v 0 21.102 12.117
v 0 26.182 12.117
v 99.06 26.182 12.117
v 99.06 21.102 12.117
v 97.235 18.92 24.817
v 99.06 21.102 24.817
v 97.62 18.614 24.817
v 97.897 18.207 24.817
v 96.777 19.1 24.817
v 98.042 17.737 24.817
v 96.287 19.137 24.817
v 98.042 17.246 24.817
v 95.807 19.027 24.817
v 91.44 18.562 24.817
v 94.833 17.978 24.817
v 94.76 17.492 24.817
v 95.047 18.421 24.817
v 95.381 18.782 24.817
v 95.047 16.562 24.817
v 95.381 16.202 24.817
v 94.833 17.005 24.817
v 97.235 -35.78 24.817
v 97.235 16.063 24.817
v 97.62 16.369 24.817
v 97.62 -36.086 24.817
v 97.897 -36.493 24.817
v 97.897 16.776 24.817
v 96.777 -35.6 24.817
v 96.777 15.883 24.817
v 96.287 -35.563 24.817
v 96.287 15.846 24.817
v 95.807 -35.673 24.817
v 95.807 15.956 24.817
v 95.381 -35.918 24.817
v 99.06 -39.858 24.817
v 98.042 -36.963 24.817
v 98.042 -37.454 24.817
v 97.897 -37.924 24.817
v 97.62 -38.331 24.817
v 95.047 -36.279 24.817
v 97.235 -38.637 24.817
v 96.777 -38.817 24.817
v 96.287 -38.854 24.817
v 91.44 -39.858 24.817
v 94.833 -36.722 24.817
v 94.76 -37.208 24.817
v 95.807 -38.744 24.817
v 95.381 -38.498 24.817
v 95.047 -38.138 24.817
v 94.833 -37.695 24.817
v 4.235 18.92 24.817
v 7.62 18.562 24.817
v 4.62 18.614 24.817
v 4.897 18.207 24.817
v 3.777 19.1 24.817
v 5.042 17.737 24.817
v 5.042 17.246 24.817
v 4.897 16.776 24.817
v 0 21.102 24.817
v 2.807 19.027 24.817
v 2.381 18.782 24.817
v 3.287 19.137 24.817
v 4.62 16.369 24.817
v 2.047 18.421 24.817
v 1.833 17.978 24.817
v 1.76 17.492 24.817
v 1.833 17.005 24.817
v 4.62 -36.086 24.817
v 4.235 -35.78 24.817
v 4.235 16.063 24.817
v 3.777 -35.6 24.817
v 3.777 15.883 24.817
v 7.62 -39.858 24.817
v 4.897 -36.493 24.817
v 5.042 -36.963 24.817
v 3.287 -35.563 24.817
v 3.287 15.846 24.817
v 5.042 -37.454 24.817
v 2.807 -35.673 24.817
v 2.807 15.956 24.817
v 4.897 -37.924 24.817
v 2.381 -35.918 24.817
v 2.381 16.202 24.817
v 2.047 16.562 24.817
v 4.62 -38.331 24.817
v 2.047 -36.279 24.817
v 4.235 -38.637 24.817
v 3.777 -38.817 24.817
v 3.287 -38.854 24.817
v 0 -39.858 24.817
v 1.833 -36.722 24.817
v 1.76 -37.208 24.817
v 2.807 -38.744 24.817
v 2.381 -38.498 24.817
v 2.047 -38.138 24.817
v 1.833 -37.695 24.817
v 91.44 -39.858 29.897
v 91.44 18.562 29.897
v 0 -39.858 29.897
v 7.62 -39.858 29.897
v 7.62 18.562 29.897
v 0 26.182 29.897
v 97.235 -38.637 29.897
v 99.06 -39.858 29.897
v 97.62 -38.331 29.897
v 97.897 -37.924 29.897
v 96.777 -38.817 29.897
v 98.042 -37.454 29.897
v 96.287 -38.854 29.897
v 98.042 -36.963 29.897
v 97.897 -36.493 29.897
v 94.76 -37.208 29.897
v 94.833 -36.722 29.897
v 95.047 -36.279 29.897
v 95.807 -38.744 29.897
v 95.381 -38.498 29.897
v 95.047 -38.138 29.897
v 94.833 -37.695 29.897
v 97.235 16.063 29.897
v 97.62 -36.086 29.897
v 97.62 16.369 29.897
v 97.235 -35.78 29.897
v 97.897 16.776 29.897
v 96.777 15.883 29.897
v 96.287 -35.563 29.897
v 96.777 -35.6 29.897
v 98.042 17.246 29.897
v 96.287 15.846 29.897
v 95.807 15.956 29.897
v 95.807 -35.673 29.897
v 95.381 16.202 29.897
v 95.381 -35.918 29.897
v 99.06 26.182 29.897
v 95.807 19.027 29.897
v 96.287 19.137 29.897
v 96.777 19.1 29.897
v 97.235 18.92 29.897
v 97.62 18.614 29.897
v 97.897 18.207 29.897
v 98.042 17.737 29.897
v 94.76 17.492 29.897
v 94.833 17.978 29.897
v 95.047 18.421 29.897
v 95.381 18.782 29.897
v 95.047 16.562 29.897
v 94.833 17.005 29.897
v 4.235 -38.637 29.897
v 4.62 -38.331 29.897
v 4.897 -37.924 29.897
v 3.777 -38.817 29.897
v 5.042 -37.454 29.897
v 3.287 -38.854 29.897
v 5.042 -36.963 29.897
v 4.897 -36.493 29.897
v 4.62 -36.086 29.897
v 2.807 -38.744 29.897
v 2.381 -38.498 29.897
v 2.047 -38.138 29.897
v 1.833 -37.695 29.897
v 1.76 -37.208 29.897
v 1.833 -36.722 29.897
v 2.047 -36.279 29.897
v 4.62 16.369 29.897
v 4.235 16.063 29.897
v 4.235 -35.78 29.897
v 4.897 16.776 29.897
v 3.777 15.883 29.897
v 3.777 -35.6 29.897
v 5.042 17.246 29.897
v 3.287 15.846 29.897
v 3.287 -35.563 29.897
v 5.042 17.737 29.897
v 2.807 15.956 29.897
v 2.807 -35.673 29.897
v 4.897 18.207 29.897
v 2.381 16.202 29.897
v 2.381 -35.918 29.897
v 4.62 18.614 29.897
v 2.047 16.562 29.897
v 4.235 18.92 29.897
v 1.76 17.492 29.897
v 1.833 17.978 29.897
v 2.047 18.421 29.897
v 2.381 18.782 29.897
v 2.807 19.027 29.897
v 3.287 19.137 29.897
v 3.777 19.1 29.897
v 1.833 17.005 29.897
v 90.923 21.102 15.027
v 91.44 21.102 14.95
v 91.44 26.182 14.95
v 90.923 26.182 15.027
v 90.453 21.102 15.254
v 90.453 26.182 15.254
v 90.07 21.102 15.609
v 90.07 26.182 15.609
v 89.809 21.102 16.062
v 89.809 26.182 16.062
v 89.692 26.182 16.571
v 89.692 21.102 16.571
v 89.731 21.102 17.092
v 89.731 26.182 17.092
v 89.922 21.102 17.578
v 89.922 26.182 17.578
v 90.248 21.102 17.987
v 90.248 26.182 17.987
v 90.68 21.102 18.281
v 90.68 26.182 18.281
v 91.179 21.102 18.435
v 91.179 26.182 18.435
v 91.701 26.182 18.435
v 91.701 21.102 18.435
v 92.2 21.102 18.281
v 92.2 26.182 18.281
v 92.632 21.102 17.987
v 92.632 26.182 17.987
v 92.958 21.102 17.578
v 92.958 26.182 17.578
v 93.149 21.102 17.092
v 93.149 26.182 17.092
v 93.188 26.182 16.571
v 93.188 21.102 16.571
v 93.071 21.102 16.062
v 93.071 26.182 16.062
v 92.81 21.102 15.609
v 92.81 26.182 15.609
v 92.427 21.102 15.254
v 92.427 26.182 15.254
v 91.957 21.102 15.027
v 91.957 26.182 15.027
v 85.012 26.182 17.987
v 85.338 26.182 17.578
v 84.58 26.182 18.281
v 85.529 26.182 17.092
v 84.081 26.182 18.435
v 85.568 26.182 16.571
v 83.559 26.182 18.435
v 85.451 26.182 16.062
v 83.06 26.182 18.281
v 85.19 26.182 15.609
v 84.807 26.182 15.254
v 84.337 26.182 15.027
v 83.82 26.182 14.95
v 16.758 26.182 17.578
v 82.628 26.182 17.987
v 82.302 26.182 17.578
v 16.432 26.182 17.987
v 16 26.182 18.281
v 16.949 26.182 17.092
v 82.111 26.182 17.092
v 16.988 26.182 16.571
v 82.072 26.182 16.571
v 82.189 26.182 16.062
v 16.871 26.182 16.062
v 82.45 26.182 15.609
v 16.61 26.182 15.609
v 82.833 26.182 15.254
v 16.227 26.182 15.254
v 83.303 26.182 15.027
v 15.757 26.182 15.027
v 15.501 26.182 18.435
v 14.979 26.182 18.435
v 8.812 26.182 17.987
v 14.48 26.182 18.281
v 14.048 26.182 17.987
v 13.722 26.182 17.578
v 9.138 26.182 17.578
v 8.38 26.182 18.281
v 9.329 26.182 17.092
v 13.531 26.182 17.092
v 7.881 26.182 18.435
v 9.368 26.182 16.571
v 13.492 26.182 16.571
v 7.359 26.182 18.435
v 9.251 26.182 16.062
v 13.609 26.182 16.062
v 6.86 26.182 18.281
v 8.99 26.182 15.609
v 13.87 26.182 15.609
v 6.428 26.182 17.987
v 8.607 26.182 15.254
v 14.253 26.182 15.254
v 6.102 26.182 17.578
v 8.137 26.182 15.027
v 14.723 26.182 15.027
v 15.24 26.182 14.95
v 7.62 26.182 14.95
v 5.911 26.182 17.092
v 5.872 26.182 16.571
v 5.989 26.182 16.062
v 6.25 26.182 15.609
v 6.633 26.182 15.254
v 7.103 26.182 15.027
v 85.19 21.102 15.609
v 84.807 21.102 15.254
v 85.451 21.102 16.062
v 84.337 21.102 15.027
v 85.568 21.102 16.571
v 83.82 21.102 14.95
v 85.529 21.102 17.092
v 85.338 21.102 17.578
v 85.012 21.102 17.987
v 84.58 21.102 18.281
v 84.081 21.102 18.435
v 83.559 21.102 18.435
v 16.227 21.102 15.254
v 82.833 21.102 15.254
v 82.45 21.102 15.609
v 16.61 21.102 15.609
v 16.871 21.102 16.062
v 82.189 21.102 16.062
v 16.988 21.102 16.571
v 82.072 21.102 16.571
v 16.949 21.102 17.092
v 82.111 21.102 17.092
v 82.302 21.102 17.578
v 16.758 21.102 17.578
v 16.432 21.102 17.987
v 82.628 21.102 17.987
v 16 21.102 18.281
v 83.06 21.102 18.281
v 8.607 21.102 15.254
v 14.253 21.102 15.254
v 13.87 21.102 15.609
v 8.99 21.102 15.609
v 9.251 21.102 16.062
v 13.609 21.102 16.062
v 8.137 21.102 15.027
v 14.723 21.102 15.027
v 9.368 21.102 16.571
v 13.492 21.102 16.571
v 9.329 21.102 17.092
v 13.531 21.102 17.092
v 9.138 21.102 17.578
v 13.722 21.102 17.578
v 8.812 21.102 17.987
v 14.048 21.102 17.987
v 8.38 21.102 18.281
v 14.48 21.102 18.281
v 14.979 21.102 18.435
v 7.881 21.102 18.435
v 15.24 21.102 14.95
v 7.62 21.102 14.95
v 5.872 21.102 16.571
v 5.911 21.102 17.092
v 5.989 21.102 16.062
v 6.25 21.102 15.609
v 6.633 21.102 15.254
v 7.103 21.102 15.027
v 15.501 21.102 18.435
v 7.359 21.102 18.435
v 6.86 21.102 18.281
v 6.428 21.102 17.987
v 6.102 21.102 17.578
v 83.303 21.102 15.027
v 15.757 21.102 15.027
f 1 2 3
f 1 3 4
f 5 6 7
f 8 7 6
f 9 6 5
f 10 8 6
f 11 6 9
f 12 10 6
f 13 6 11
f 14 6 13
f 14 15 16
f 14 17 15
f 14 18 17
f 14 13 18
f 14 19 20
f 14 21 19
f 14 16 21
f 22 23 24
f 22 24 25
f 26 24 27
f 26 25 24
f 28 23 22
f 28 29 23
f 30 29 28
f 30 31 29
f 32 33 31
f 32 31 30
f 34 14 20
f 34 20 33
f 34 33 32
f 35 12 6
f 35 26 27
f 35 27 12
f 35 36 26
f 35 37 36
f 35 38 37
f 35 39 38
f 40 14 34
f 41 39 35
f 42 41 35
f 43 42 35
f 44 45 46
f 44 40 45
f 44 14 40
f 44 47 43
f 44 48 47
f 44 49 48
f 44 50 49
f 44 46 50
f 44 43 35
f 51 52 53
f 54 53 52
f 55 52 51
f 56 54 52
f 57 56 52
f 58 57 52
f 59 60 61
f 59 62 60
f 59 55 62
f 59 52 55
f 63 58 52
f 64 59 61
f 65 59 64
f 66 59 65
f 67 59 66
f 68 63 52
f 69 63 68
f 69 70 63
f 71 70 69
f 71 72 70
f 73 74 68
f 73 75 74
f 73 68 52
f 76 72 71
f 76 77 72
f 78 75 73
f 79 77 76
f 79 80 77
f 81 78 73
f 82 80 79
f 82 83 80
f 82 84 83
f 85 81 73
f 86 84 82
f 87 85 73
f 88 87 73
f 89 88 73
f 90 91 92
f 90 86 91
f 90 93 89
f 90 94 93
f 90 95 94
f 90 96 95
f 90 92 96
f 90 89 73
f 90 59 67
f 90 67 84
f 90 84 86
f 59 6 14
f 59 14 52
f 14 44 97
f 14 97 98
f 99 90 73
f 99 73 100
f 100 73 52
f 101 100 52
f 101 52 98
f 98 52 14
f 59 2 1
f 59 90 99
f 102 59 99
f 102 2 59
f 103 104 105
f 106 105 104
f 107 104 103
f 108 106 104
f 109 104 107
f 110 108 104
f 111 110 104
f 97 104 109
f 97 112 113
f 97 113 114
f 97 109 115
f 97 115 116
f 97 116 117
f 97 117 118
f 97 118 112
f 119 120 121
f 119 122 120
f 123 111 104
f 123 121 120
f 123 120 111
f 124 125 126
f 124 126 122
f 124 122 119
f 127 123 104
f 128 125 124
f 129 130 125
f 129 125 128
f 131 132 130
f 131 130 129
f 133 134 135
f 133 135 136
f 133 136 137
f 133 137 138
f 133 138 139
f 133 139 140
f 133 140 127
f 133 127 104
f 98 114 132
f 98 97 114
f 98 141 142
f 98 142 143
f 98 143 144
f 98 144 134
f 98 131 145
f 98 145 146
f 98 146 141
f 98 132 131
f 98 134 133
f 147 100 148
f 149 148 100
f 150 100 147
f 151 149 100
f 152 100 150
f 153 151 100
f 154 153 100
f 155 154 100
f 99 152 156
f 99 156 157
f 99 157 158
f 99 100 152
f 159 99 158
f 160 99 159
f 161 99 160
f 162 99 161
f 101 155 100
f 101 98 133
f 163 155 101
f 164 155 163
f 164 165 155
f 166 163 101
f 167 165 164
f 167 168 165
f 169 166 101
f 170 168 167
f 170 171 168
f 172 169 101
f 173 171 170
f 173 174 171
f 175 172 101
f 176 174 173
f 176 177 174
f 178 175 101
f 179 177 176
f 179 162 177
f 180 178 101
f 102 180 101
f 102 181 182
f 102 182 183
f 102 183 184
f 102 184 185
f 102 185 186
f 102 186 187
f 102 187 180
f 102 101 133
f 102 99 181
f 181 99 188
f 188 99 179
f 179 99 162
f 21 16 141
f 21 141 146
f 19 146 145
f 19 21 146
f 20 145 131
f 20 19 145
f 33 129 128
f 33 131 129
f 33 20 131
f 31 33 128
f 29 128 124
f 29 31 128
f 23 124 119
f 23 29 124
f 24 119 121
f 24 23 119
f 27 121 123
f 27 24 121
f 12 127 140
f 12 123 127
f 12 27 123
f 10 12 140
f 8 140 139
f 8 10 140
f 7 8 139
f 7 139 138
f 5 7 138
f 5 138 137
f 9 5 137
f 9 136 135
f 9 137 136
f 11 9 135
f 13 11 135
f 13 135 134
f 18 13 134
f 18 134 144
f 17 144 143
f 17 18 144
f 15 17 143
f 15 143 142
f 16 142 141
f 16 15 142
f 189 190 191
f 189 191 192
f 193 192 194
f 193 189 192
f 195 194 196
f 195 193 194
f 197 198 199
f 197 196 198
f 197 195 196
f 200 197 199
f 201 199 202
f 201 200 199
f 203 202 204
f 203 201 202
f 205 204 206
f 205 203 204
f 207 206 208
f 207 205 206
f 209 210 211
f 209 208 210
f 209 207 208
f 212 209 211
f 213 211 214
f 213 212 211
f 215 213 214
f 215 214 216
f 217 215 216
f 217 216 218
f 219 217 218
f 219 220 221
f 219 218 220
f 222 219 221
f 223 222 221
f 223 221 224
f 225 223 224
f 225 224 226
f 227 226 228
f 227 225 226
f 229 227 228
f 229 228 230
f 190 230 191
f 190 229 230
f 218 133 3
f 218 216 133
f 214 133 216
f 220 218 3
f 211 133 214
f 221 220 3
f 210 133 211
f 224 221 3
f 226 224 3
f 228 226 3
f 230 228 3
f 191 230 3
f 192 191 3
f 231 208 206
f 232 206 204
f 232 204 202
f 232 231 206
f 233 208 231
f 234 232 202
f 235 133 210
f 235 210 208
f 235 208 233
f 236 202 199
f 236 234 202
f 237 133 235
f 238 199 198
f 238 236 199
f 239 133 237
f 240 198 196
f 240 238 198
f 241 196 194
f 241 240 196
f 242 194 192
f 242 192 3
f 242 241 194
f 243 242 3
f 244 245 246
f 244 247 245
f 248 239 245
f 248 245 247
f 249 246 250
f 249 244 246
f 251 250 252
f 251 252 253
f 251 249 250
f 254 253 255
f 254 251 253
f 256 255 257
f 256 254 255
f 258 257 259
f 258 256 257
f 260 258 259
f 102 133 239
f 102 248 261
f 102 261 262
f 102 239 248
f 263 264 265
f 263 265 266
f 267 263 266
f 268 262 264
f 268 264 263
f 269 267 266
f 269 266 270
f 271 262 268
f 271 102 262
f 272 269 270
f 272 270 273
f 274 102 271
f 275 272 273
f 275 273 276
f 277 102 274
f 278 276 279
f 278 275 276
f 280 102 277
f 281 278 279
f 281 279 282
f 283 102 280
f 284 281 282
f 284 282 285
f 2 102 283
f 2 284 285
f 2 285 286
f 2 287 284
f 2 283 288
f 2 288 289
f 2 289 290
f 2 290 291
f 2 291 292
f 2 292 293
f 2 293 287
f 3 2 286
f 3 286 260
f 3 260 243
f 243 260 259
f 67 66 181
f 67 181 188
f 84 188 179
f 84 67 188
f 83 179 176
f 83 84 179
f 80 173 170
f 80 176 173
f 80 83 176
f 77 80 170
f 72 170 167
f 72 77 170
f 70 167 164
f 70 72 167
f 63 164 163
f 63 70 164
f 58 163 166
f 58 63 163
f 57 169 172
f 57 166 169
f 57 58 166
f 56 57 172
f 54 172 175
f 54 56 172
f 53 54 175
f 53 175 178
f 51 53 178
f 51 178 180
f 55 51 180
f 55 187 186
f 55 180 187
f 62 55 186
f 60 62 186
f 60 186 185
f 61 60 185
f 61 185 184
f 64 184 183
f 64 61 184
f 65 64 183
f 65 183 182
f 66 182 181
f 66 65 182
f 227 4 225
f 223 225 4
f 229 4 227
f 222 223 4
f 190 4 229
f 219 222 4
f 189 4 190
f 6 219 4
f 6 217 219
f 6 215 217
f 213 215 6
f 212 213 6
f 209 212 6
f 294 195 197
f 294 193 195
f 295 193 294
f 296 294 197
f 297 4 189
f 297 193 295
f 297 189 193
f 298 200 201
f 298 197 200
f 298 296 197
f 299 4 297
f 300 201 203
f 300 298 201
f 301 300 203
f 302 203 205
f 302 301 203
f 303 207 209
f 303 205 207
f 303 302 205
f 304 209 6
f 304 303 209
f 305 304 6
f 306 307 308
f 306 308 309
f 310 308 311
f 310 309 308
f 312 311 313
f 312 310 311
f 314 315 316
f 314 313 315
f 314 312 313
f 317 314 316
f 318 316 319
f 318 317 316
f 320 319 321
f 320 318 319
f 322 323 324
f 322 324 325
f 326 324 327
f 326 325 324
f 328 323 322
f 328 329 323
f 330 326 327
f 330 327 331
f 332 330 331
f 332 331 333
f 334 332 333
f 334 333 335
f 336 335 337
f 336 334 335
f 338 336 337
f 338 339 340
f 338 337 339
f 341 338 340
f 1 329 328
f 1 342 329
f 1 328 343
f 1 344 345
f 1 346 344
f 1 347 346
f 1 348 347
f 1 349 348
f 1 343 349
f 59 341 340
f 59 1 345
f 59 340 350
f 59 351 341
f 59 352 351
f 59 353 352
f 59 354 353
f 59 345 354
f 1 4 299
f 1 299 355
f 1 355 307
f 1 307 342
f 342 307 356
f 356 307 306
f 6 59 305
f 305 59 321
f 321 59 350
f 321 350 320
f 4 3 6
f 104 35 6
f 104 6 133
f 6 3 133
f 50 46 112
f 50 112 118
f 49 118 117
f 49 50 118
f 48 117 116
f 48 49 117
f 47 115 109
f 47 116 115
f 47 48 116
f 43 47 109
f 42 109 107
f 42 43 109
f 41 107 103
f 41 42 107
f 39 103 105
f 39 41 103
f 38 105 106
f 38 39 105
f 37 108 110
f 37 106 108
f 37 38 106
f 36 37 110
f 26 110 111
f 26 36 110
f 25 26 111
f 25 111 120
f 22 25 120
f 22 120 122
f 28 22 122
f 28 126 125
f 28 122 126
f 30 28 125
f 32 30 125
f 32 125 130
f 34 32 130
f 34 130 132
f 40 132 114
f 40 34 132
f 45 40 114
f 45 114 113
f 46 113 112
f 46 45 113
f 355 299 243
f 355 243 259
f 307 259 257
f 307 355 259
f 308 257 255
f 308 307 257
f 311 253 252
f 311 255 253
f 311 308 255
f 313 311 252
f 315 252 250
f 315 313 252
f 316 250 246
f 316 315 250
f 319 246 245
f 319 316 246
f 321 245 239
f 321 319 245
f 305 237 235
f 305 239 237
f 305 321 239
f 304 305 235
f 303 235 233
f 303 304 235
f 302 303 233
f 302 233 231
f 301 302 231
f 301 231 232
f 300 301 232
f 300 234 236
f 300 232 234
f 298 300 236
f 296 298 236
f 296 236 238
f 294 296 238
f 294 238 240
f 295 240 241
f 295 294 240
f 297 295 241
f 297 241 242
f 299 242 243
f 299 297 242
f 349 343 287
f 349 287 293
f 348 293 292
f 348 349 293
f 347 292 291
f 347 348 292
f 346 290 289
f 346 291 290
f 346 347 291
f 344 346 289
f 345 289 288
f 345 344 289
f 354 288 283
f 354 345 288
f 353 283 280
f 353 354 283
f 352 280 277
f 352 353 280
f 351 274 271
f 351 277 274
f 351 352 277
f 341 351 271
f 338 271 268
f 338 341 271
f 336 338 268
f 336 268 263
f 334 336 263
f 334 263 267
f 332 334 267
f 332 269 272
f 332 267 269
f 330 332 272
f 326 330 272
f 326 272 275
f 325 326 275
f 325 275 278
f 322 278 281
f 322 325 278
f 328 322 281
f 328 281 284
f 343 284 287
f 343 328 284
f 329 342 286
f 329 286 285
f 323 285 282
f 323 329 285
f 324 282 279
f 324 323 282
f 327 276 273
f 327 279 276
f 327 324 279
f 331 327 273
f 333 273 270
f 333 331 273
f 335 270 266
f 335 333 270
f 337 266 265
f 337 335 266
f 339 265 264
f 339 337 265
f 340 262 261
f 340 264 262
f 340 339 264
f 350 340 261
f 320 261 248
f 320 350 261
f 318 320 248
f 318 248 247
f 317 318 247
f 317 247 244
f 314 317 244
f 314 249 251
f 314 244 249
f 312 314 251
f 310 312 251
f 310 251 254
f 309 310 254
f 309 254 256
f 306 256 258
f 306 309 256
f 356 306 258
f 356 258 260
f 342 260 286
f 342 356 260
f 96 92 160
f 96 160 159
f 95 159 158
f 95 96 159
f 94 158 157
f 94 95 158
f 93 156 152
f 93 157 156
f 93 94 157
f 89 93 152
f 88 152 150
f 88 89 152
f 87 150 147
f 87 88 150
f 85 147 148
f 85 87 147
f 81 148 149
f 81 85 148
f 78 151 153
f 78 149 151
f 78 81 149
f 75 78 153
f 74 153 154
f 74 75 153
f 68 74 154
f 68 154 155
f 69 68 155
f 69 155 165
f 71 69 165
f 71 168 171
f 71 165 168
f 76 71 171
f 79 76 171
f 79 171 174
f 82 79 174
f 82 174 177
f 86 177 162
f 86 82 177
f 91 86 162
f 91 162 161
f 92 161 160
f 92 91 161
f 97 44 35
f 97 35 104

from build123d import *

# Parameters (mm, degrees)
BOSS_EXTRUDE1_DEPTH = 99.06
SKETCH2_W           = 83.82
SKETCH2_H           = 60.96
CUT_EXTRUDE1_DEPTH  = 86.106
SKETCH3_R           = 1.65
CUT_EXTRUDE2_DEPTH  = 228.6
SKETCH4_R           = 1.7526
CUT_EXTRUDE3_DEPTH  = 228.6


with BuildPart() as part:
    # Sketch1 → Boss-Extrude1 (new body)
    with BuildSketch(Plane(origin=(0, 0, 0), x_dir=(0, 0, -1), z_dir=(1, 0, 0))):
        Polygon((-29.897403577, 26.181538462), (-12.117403577, 26.181538462), (-12.117403577, 21.101538462), (-24.817403577, 21.101538462), (-24.817403577, -39.858461538), (-29.897403577, -39.858461538), align=None)
    extrude(amount=BOSS_EXTRUDE1_DEPTH)

    # Sketch2 → Cut-Extrude1 (cut)
    with BuildSketch(Plane.XY):
        with Locations((49.53, -11.918461538)):
            Rectangle(SKETCH2_W, SKETCH2_H)
    extrude(amount=CUT_EXTRUDE1_DEPTH, mode=Mode.SUBTRACT)

    # Sketch3 → Cut-Extrude2 (cut)
    with BuildSketch(Plane.XY):
        with Locations(Location((96.41, -37.208461538, 0), (0, 0, 180))):
            Circle(SKETCH3_R)
        with Locations(Location((96.41, 17.491538462, 0), (0, 0, 180))):
            Circle(SKETCH3_R)
        with Locations(Location((3.41, 17.491538462, 0), (0, 0, 180))):
            Circle(SKETCH3_R)
        with Locations(Location((3.41, -37.208461538, 0), (0, 0, 180))):
            Circle(SKETCH3_R)
    extrude(amount=CUT_EXTRUDE2_DEPTH, mode=Mode.SUBTRACT)

    # Sketch4 → Cut-Extrude3 (cut)
    with BuildSketch(Plane(origin=(0, 0, 0), x_dir=(1, 0, 0), z_dir=(0, 1, 0))):
        with Locations(Location((7.62, -16.70215043, 0), (0, 0, 90))):
            Circle(SKETCH4_R)
        with Locations(Location((15.24, -16.70215043, 0), (0, 0, 90))):
            Circle(SKETCH4_R)
        with Locations(Location((83.82, -16.70215043, 0), (0, 0, 90))):
            Circle(SKETCH4_R)
        with Locations(Location((91.44, -16.70215043, 0), (0, 0, 90))):
            Circle(SKETCH4_R)
    extrude(amount=CUT_EXTRUDE3_DEPTH, mode=Mode.SUBTRACT)


solid = part.part
